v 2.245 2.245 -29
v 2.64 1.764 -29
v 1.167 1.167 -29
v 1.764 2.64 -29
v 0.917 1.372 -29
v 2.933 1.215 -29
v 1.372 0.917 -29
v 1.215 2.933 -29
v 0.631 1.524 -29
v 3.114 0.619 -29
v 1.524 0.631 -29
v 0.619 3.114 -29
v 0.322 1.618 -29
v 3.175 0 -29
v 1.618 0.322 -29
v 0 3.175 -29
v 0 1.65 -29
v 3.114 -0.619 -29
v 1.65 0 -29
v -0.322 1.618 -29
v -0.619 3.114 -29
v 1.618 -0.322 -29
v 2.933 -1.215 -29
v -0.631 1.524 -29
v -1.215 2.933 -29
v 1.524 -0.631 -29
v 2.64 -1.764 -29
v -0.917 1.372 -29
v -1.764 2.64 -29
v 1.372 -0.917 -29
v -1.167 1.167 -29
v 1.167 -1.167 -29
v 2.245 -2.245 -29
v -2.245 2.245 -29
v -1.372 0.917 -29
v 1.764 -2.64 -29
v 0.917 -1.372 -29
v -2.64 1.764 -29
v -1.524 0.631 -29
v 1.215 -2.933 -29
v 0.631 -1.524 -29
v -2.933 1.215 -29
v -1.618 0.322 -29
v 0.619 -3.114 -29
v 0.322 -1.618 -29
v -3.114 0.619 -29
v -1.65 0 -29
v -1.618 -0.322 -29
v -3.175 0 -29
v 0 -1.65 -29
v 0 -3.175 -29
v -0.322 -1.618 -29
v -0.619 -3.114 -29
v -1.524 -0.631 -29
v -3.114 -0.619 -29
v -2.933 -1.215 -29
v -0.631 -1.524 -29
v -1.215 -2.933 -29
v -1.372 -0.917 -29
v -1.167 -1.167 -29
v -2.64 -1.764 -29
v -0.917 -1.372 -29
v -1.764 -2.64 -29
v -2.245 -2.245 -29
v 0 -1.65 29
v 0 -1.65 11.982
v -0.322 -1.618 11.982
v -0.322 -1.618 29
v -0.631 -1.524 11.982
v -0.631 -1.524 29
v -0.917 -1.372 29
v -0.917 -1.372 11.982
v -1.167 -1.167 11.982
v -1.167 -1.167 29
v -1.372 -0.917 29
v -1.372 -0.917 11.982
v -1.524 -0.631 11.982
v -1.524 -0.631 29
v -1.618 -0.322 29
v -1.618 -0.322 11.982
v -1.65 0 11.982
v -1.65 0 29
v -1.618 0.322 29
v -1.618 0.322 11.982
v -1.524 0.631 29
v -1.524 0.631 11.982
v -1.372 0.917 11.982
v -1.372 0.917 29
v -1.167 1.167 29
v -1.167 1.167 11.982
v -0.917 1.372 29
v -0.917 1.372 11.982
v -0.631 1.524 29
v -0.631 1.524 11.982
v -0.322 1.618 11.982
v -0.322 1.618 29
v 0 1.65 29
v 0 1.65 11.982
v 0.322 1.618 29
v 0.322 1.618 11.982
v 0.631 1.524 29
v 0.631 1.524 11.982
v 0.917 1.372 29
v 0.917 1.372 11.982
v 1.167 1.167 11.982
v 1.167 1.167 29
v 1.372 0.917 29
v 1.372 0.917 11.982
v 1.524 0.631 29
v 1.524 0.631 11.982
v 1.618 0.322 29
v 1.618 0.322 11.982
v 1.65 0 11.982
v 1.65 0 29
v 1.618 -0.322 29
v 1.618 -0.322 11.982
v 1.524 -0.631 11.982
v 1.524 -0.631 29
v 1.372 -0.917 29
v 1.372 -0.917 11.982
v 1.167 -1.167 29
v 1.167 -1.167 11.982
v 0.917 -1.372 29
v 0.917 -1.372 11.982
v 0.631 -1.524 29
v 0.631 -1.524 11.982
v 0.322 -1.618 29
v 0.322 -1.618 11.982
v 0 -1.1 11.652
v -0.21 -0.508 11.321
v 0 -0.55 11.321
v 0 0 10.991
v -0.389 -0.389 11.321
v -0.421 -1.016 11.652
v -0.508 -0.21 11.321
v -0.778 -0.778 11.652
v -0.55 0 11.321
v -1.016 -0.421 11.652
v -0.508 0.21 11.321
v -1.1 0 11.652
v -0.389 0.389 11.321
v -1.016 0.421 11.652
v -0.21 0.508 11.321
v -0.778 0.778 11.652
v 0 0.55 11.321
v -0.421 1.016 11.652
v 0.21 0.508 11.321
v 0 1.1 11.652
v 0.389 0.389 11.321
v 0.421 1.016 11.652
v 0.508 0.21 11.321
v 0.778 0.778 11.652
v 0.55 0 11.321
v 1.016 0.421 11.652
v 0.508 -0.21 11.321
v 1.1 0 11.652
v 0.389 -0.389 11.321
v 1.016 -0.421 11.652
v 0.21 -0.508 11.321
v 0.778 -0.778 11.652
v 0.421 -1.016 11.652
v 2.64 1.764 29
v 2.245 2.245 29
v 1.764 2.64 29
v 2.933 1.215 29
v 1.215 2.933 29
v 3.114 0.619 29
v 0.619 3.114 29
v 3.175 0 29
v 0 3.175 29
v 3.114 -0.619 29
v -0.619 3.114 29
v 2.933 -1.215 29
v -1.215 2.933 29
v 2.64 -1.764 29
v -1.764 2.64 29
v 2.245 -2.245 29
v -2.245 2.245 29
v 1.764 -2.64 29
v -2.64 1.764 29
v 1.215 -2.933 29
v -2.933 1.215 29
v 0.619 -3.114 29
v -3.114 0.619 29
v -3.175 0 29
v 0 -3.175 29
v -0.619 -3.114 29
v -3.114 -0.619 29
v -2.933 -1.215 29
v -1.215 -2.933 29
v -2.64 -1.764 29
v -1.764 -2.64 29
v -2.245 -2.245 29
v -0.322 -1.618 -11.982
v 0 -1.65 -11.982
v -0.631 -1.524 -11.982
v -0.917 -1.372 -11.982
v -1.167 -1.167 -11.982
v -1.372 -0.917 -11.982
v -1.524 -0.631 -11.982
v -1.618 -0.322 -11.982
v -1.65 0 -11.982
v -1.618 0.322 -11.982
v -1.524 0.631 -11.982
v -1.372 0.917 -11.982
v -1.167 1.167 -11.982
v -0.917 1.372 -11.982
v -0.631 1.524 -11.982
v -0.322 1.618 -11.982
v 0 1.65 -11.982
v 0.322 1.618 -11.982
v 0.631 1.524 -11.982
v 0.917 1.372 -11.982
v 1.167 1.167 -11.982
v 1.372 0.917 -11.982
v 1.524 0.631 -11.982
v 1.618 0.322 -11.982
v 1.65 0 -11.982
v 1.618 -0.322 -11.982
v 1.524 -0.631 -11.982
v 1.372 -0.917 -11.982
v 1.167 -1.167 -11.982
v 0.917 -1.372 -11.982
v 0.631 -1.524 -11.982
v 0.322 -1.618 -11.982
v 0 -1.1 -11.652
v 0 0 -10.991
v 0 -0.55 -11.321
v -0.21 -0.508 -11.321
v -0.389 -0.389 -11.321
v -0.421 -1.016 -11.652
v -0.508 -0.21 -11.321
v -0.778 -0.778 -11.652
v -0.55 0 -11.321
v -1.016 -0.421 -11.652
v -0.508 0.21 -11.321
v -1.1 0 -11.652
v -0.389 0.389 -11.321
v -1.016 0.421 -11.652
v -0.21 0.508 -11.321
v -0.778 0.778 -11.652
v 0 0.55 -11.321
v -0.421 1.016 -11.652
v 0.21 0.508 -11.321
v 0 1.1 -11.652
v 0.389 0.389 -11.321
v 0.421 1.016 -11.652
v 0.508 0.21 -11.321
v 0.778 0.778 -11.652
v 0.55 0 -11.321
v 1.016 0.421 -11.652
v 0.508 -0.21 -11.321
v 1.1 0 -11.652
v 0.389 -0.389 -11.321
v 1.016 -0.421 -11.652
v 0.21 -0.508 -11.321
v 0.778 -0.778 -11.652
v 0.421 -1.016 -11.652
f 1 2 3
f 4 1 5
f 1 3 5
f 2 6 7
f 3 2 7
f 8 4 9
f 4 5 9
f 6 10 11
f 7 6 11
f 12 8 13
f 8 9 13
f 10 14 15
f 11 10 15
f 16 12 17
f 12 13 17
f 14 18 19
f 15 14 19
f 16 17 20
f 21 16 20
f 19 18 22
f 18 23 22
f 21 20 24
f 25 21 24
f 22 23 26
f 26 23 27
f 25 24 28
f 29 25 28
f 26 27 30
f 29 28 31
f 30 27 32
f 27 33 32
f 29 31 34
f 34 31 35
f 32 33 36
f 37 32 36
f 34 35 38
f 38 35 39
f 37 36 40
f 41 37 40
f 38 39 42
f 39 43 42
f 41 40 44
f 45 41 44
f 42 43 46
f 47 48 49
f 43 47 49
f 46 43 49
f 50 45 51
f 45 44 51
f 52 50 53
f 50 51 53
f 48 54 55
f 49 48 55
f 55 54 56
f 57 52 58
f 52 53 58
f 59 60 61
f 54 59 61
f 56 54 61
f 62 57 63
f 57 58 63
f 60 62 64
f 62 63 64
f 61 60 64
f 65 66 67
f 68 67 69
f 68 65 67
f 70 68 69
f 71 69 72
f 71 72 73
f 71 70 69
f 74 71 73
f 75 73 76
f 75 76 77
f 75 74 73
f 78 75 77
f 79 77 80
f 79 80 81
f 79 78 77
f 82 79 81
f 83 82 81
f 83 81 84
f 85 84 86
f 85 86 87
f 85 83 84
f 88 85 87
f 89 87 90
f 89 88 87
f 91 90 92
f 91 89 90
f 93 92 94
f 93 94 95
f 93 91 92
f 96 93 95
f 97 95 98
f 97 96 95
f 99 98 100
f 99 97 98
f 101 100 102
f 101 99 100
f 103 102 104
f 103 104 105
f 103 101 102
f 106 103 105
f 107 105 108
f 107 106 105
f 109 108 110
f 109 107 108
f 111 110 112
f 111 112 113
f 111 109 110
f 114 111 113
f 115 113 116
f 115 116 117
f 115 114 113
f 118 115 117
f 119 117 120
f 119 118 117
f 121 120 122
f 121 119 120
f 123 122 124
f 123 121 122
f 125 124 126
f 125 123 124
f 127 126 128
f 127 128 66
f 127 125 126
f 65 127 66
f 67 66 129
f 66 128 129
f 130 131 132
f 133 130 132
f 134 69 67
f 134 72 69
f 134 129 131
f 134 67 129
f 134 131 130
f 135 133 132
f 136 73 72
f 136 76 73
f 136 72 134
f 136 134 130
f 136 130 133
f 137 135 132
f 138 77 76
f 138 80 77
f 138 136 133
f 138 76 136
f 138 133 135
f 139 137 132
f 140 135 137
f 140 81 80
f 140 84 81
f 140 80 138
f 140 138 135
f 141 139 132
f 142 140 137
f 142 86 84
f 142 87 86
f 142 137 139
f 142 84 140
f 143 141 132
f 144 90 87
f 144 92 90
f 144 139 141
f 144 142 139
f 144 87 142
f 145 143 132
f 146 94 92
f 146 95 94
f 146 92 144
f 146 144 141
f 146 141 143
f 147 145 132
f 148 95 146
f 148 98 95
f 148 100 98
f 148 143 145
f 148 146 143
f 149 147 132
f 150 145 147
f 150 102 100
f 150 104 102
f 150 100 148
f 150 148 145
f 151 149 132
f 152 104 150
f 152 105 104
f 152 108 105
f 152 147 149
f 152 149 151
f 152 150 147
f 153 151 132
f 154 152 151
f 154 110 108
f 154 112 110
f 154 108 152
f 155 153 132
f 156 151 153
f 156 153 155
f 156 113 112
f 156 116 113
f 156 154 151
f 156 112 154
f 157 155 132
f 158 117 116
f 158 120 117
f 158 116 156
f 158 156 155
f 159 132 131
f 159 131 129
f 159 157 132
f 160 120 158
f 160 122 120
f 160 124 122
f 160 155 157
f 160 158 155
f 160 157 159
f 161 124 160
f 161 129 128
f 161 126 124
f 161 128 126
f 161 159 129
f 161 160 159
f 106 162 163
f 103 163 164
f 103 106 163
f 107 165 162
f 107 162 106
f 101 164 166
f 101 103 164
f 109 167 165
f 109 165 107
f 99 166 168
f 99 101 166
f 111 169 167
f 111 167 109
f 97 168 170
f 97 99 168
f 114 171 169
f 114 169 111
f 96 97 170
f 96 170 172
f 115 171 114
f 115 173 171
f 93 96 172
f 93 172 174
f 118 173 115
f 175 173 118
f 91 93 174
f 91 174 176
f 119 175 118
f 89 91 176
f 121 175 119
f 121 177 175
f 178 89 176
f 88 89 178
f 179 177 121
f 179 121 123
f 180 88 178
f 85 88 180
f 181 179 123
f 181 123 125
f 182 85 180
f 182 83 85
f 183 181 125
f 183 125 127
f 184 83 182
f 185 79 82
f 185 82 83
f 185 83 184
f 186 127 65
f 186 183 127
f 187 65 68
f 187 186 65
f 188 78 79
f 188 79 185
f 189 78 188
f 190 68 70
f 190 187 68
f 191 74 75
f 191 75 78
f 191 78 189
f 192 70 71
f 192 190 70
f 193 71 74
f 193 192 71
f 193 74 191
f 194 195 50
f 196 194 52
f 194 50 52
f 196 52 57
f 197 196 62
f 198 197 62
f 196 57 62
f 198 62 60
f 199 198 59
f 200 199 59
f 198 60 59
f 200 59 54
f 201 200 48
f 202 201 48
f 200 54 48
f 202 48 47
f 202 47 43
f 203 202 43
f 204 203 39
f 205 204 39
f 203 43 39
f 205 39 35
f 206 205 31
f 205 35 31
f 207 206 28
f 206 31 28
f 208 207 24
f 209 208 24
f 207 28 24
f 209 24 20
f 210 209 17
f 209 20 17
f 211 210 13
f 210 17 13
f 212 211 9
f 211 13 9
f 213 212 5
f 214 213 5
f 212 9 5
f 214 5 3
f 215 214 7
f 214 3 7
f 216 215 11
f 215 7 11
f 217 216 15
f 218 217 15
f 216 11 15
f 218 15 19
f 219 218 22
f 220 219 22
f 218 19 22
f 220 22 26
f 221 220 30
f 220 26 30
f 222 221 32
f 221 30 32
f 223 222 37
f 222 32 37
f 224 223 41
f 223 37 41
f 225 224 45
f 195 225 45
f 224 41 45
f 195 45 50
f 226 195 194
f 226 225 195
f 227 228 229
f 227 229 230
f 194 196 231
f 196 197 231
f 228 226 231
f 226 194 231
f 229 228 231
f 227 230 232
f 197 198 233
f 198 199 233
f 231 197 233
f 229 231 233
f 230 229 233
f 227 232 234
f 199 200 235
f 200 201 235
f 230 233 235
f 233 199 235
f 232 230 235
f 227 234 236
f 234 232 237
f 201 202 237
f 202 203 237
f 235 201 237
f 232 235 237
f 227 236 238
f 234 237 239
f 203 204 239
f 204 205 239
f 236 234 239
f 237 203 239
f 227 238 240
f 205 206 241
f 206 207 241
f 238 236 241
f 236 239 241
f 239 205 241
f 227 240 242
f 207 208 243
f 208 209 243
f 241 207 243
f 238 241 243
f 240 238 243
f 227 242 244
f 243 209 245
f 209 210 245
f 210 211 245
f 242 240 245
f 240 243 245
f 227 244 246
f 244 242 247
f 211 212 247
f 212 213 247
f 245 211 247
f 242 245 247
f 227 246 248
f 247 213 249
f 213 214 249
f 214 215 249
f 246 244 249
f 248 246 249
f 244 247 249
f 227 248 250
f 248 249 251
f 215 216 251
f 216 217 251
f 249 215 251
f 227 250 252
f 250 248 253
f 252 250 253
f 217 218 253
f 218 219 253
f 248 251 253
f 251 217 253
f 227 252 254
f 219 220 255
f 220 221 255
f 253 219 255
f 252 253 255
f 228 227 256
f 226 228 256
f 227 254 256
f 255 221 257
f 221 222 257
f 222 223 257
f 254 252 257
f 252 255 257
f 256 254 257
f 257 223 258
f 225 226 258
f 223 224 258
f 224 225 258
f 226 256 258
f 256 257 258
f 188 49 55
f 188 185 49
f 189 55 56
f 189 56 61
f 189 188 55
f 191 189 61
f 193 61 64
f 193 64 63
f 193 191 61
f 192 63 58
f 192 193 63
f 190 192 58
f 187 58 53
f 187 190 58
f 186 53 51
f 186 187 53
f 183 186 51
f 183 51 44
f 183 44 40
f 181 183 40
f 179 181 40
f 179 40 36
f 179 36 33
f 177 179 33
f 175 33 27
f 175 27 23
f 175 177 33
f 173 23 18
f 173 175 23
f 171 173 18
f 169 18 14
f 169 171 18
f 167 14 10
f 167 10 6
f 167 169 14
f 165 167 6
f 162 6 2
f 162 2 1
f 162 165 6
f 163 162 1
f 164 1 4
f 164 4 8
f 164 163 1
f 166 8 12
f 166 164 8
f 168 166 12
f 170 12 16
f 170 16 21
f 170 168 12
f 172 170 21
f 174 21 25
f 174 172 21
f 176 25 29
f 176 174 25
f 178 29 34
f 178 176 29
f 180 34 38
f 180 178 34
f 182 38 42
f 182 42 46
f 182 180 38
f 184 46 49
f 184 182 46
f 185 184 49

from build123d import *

# Parameters (mm, degrees)
SKETCH1_R           = 3.175
BOSS_EXTRUDE1_DEPTH = 29


with BuildPart() as part:
    # Sketch1 → Boss-Extrude1 (new, symmetric)
    with BuildSketch(Plane.XY):
        with Locations(Location((0, 0, 0), (0, 0, 180))):
            Circle(SKETCH1_R)
    extrude(amount=BOSS_EXTRUDE1_DEPTH, both=True)

    # Sketch3 → M4x0.7 Tapped Hole1 (revolve, cut)
    with BuildSketch(Plane(origin=(0, 0, 29), x_dir=(0, -1, 0), z_dir=(1, 0, 0))):
        Polygon((0, 0), (0, 18.009420021), (1.65, 17.018), (1.65, 0), align=None)
    m4x0_7_tapped_hole1 = revolve(axis=Axis((0, 0, 35.35), (0, 0, -1)), mode=Mode.SUBTRACT)

    # Mirror1: M4x0.7 Tapped Hole1 across plane
    add(m4x0_7_tapped_hole1.mirror(Plane.XY), mode=Mode.SUBTRACT)


solid = part.part
